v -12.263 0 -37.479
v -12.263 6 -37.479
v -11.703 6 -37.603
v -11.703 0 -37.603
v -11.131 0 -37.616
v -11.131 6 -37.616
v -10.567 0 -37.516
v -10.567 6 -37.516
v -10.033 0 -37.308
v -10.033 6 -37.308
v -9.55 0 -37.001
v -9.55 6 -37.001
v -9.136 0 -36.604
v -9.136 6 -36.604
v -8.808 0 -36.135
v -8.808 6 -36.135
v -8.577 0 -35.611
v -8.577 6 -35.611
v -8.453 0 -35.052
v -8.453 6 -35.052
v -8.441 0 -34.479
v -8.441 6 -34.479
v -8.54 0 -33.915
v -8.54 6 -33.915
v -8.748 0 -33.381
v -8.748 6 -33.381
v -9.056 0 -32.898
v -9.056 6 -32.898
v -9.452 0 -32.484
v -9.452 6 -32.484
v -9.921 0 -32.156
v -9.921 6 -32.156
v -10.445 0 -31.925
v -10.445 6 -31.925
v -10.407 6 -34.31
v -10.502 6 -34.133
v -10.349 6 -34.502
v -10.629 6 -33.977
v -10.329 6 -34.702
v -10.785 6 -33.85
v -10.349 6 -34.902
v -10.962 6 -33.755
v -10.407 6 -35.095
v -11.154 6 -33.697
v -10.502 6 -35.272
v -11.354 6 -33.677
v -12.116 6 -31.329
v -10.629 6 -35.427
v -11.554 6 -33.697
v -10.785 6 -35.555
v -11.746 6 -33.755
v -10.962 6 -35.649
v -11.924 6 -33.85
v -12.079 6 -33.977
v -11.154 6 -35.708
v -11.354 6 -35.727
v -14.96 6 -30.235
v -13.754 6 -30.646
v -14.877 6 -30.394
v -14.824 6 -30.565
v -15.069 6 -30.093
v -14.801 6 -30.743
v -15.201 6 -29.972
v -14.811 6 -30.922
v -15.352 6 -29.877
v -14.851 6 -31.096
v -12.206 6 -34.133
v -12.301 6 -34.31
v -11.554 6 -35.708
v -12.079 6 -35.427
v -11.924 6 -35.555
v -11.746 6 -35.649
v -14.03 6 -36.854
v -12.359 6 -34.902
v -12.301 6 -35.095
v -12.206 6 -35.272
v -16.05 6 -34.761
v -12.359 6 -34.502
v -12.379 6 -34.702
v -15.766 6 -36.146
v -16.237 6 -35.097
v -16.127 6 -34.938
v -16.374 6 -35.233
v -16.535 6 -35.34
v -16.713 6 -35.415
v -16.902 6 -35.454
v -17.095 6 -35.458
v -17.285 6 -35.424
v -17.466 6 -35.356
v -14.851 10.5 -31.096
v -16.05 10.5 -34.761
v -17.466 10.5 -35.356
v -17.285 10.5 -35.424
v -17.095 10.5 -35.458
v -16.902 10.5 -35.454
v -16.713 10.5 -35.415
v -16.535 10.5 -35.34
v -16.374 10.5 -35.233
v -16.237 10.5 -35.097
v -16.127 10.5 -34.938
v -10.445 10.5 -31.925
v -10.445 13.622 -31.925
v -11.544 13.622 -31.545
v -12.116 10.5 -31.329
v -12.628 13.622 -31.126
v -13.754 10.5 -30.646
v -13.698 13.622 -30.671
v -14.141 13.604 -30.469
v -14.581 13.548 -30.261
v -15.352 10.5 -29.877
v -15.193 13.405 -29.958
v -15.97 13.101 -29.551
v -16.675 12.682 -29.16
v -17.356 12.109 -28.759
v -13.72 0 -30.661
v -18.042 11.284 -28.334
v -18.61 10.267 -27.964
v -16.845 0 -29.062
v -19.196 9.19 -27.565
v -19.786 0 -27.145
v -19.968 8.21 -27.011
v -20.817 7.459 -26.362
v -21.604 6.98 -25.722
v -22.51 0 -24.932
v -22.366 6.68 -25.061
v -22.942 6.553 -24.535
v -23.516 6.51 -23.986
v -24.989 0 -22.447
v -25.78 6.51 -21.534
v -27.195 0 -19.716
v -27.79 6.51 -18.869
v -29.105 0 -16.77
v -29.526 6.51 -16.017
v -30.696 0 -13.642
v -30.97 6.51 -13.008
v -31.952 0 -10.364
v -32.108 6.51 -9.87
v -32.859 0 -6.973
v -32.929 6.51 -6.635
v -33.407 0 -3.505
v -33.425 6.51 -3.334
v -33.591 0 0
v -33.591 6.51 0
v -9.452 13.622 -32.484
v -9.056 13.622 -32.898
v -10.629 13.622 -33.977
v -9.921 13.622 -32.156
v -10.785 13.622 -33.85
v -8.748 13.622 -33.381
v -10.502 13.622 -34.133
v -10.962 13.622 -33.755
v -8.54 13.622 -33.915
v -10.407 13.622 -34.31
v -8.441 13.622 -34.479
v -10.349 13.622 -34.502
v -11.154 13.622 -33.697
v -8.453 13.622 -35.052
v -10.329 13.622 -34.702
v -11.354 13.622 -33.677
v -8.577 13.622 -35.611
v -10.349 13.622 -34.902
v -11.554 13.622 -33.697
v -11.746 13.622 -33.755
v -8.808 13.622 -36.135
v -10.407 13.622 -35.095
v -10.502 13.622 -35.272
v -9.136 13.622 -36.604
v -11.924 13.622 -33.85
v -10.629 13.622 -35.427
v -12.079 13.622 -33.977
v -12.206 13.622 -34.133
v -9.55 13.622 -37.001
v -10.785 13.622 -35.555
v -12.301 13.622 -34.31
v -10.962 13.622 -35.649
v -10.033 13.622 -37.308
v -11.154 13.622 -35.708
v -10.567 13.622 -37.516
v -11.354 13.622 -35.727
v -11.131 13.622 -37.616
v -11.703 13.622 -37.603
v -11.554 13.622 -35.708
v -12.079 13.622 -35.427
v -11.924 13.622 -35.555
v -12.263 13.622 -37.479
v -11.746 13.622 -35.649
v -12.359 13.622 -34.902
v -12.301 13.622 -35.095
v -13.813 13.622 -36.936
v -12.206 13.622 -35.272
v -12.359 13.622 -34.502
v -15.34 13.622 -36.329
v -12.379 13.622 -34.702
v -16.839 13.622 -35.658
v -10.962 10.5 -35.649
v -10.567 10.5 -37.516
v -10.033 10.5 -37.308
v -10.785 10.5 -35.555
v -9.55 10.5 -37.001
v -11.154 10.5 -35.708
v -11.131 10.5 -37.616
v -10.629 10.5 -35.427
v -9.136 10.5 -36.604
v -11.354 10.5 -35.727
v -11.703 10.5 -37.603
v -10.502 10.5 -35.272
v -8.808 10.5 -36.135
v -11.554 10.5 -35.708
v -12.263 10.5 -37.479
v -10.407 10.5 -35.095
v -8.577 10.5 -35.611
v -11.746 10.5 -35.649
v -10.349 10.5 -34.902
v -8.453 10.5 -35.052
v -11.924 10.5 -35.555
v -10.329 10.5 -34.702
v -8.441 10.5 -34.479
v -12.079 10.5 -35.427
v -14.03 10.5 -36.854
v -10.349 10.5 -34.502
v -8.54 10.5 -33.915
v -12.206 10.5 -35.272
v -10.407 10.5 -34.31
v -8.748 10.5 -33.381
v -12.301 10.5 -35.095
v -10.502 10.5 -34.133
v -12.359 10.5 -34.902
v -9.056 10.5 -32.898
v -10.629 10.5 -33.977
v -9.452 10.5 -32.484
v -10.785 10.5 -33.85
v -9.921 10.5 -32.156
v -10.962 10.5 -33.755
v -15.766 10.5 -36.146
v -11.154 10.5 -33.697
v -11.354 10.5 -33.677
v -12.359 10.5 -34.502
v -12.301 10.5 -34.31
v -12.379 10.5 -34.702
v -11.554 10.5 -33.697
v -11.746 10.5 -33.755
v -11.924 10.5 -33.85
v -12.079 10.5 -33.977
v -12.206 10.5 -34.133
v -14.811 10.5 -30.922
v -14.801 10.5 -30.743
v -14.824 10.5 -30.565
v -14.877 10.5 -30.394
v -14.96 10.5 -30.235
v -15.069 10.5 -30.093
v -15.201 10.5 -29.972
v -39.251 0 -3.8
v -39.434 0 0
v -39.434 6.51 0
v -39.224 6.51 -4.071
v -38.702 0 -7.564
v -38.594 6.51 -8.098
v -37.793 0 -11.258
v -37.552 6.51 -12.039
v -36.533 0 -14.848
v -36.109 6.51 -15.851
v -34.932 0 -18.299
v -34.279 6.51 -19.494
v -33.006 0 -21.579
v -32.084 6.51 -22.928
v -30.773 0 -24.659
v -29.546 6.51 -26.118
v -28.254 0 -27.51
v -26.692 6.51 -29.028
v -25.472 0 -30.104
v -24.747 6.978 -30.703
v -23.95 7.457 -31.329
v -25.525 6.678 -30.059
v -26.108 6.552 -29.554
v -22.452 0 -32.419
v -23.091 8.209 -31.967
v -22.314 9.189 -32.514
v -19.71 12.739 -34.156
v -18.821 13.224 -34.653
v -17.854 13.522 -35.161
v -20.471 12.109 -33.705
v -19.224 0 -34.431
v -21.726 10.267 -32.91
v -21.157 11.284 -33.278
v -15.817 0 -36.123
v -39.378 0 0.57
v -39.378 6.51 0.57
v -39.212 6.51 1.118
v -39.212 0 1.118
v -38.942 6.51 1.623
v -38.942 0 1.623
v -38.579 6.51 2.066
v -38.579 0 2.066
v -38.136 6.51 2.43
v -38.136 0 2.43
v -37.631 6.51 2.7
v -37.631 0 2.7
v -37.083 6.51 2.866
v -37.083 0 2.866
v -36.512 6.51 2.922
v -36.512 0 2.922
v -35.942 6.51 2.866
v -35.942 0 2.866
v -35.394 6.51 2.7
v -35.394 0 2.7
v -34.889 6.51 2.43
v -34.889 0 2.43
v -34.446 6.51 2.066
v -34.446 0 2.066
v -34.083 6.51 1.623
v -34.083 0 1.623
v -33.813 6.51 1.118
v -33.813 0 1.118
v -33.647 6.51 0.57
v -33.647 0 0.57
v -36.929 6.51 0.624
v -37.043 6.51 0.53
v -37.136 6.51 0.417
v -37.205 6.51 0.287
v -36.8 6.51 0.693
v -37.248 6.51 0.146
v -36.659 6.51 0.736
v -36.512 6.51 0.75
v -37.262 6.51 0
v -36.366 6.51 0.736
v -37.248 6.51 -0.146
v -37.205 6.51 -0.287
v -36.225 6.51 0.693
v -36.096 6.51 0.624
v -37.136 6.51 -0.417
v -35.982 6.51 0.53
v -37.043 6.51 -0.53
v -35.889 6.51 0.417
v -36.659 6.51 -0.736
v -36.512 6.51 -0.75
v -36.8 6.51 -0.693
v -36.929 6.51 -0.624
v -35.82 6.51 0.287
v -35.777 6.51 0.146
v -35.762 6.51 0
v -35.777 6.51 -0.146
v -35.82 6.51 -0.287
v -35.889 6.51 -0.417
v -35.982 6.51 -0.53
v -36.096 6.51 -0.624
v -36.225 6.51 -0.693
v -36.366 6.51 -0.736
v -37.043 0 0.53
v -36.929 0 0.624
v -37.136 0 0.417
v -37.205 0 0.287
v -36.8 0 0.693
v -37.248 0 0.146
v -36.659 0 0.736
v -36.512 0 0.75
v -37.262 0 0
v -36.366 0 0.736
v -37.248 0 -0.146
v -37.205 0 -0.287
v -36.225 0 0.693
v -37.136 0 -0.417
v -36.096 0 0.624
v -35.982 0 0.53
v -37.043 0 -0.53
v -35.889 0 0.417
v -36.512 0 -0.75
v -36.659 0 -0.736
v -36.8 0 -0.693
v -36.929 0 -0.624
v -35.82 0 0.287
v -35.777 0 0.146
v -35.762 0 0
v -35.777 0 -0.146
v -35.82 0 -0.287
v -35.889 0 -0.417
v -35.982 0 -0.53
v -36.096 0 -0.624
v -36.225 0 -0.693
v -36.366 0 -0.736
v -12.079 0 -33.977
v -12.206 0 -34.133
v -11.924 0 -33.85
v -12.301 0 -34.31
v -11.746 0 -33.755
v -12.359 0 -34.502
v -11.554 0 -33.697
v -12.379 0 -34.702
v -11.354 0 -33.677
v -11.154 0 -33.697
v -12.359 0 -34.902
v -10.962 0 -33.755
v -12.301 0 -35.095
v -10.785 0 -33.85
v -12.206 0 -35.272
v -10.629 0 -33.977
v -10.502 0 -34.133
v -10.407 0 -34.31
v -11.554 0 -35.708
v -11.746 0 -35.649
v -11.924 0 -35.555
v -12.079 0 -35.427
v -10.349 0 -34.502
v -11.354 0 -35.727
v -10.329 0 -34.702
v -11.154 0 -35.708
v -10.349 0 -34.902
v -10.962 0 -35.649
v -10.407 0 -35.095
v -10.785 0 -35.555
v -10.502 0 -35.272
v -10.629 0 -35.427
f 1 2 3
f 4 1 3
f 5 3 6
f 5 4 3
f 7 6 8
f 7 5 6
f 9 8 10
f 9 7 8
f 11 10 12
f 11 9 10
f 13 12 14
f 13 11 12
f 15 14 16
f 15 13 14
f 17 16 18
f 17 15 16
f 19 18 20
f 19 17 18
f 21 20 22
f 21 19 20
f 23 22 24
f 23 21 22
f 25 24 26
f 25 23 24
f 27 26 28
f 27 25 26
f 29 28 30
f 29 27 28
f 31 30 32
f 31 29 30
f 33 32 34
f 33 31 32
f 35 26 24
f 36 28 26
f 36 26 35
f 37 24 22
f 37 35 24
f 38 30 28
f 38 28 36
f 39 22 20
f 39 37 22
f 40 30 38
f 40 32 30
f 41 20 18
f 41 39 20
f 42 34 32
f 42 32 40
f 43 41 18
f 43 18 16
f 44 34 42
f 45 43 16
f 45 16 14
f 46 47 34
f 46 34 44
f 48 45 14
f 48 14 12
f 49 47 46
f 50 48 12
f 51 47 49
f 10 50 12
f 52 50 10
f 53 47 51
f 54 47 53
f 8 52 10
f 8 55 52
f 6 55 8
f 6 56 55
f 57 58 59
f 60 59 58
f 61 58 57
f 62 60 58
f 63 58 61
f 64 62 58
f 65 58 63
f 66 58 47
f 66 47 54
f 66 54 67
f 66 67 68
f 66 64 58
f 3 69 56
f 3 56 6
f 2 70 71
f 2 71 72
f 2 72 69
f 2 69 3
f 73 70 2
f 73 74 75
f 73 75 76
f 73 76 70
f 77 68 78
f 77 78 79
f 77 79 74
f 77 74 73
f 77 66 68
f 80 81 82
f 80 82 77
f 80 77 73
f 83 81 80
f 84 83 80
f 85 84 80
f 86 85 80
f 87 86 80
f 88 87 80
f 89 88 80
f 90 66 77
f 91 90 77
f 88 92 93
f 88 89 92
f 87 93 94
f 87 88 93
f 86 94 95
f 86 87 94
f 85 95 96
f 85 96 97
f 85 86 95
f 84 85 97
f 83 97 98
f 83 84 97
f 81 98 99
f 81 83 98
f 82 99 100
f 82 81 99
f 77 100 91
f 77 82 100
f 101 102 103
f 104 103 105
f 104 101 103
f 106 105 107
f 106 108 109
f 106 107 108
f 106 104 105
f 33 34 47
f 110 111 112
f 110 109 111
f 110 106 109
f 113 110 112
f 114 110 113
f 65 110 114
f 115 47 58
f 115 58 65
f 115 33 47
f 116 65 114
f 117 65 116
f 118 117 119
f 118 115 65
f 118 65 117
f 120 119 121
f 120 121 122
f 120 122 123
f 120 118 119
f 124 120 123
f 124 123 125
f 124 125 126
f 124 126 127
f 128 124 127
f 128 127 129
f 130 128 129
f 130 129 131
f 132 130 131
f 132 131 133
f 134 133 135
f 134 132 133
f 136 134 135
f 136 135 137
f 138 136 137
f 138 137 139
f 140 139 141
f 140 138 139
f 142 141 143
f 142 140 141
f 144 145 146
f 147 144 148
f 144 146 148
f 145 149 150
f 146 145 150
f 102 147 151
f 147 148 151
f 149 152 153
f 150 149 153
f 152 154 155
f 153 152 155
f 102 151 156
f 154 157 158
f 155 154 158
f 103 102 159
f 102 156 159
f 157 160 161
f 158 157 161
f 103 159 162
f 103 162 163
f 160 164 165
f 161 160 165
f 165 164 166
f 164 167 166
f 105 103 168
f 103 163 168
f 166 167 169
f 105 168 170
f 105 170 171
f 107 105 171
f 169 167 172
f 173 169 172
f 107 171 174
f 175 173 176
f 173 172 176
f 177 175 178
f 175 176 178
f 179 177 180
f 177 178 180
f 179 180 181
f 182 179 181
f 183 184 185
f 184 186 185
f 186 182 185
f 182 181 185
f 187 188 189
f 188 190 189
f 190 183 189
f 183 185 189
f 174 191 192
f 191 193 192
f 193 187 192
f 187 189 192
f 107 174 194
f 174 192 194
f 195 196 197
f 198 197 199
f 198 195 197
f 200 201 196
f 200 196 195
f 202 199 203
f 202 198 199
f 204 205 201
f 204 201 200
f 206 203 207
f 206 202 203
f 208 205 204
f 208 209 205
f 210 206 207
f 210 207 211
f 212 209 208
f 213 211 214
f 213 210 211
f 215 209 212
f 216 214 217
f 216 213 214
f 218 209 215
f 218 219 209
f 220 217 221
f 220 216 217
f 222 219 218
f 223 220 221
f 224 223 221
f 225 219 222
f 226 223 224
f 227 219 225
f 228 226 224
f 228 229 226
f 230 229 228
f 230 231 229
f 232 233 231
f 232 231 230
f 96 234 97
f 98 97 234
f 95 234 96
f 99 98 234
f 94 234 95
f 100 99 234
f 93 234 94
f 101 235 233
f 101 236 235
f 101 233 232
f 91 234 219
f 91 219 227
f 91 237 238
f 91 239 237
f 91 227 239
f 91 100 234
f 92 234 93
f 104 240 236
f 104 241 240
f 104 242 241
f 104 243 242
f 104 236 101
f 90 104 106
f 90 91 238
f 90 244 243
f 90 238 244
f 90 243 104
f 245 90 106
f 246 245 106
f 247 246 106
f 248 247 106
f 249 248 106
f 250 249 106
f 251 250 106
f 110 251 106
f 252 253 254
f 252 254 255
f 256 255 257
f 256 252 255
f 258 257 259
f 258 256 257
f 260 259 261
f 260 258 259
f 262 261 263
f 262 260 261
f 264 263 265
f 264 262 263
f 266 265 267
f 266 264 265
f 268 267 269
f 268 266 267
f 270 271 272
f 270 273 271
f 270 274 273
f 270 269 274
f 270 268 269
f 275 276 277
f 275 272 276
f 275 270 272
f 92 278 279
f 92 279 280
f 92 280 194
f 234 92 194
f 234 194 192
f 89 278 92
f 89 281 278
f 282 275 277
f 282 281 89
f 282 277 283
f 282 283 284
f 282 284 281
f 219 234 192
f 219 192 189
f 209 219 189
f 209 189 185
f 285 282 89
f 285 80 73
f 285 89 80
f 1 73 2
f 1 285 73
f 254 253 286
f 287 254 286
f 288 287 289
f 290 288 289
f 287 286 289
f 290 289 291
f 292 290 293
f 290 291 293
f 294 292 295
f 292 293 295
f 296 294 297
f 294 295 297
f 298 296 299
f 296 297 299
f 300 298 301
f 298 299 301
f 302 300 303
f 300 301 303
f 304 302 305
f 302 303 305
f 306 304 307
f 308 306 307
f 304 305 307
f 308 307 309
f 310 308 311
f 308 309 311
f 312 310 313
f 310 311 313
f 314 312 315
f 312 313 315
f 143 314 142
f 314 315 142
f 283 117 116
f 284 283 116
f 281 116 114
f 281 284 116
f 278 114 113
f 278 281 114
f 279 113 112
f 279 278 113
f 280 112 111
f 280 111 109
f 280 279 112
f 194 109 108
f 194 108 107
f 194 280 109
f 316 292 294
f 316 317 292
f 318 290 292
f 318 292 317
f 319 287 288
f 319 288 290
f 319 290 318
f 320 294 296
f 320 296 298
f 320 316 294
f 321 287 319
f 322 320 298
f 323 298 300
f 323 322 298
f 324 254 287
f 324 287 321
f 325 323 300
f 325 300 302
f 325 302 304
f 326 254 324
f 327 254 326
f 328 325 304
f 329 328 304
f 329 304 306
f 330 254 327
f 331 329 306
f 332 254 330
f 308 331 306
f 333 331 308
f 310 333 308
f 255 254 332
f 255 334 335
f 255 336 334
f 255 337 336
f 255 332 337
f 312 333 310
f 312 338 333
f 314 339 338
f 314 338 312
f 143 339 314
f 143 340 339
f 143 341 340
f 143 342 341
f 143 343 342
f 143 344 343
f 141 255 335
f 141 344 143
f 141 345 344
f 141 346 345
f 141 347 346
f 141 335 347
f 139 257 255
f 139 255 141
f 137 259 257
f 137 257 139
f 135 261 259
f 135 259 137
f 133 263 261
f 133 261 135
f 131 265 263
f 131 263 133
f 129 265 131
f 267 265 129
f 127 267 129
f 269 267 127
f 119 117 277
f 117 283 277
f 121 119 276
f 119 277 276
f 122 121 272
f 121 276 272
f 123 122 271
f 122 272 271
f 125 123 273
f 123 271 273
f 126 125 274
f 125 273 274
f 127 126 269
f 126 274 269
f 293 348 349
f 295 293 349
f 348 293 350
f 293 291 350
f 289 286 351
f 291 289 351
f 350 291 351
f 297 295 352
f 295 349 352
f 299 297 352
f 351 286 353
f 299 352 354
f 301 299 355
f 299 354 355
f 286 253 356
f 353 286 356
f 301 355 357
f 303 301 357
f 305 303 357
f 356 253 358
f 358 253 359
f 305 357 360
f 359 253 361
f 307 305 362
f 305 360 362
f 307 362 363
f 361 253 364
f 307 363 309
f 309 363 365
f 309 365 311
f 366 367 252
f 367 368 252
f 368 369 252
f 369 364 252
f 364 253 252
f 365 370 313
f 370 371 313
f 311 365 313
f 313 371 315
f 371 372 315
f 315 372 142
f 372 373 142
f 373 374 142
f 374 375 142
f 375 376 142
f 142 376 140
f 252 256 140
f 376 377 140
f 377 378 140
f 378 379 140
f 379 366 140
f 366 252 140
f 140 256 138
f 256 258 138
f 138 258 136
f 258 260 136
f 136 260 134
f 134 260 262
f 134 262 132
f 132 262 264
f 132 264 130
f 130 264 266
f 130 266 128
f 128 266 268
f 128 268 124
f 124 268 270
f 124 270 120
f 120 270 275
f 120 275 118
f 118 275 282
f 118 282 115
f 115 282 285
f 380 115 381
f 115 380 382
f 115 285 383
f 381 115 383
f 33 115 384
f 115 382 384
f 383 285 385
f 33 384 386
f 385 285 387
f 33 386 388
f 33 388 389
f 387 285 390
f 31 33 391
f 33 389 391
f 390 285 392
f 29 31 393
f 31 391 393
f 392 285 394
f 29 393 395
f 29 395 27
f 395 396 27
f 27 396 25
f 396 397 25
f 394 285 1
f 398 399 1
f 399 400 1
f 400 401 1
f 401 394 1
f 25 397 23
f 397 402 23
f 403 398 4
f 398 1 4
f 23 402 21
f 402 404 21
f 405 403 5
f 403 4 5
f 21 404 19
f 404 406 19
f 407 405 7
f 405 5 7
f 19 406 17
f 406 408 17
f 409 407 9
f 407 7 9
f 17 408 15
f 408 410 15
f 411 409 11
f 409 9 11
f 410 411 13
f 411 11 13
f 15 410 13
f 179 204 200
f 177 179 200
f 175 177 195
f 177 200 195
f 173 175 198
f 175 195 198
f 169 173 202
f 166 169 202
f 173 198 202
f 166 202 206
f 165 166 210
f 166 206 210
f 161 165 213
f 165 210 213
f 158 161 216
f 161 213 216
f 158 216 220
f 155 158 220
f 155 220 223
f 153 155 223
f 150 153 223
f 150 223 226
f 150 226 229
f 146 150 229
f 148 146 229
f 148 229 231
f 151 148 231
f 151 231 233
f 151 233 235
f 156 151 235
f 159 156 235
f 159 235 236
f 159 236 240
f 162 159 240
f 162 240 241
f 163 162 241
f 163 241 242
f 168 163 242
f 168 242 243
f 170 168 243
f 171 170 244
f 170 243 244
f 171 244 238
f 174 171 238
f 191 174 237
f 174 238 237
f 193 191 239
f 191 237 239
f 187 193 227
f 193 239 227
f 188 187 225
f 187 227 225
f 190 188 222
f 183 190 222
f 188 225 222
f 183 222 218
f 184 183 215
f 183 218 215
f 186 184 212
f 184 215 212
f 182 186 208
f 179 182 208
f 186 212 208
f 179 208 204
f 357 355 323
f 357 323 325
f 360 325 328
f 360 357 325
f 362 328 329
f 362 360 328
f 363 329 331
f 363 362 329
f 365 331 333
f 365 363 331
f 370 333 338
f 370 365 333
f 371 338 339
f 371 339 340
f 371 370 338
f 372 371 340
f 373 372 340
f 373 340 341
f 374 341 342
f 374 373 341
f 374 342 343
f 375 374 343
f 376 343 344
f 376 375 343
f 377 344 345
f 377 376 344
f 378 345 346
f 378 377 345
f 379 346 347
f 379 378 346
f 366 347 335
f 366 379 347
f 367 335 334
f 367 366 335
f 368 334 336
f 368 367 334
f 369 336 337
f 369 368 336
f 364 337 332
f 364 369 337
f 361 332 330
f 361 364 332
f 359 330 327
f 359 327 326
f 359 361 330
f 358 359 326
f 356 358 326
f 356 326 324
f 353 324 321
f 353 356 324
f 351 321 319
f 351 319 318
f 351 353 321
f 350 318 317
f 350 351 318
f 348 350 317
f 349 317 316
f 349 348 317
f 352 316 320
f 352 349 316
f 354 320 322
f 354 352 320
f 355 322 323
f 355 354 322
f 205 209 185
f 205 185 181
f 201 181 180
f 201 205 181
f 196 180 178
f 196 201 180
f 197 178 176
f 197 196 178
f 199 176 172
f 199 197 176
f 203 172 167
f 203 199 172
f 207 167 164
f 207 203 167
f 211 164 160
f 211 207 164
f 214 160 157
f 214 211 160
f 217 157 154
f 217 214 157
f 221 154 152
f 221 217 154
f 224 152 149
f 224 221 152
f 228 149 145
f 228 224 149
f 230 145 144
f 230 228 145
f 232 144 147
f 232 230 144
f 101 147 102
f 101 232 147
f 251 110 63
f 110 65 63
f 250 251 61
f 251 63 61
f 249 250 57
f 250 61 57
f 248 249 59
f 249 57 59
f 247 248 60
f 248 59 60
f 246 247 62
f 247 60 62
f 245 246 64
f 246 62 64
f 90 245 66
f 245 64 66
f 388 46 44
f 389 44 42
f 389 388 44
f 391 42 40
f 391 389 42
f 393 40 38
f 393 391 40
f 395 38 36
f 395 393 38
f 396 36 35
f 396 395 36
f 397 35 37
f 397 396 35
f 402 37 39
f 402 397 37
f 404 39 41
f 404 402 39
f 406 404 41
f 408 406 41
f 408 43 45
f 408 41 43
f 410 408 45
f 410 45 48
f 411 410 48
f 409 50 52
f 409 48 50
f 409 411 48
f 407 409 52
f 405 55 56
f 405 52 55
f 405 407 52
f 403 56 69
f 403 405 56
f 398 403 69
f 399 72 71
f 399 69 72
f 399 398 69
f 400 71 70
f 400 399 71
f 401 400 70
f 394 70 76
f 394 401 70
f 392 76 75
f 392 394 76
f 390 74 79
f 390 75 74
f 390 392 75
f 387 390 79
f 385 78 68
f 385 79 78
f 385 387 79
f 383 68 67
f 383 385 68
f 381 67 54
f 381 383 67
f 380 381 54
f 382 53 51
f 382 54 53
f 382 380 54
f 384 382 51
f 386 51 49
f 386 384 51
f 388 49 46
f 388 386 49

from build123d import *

# Parameters (mm, degrees)
SKETCH1_R               = 0.7499999999999986
SKETCH1_R_2             = 1.0249999999999995
BOSS_EXTRUDE1_DEPTH     = 6.510019999999999
BOSS_EXTRU_1_DEPTH      = 7.112
CONG_1_R                = 7.112
CONG_2_R                = 6.35
ENL_V_MAT_EXTRU_1_DEPTH = 4.444999999999999
ESQUISSE4_R             = 1.024999999999998
ENL_V_MAT_EXTRU_2_DEPTH = 57.18027536353634
CONG_3_R                = 1.016


with BuildPart() as part:
    # Sketch1 → Boss-Extrude1 (new body)
    with BuildSketch(Plane(origin=(0, 0, 0), x_dir=(1, 0, 0), z_dir=(0, 1, 0))):
        with BuildLine():
            ThreePointArc((-33.59051080682659, 0), (-27.195497439499345, 19.716169386615615), (-10.445442396451748, 31.92514916810793))
            ThreePointArc((-10.445442396451748, 31.92514916810793), (-8.576954256445317, 35.61090468912391), (-12.262709777461287, 37.4793928291303))
            ThreePointArc((-12.262709777461287, 37.4793928291303), (-31.926890187777666, 23.14633061338439), (-39.43448919317339, 0))
            ThreePointArc((-39.43448919317339, 0), (-36.512499999999996, -2.9219891931734026), (-33.59051080682659, 0))
        make_face()
        with Locations(Location((-36.512499999999996, 0, 0), (0, 0, 270))):
            Circle(SKETCH1_R, mode=Mode.SUBTRACT)
        with Locations(Location((-11.354076086956523, 34.702270998619134, 0), (0, 0, 270))):
            Circle(SKETCH1_R_2, mode=Mode.SUBTRACT)
    extrude(amount=BOSS_EXTRUDE1_DEPTH)

    # Esquisse1 → Boss.-Extru.1 (add)
    with BuildSketch(Plane(origin=(0, 6.510019999999999, 0), x_dir=(1, 0, 0), z_dir=(0, 1, 0))):
        with BuildLine():
            Line((-17.904180753250905, 28.421166897551096), (-21.0190975209346, 33.36579801731034))
            ThreePointArc((-21.0190975209346, 33.36579801731034), (-16.767530820930304, 35.69213986434075), (-12.262709777461293, 37.47939282913032))
            ThreePointArc((-12.262709777461293, 37.47939282913032), (-8.576954256445317, 35.610904689123906), (-10.44544239645175, 31.92514916810793))
            ThreePointArc((-10.44544239645175, 31.92514916810793), (-14.282673283409979, 30.40275744308238), (-17.904180753250905, 28.421166897551096))
        make_face()
    extrude(amount=BOSS_EXTRU_1_DEPTH)

    # Congé1
    cong_1_edges = [part.edges().sort_by_distance(p)[0] for p in [
        (-19.461639137092753, 6.510019999999999, -30.893482457430718),
    ]]
    fillet(cong_1_edges, radius=CONG_1_R - 0.0001)  # a hair under: the kernel refuses the full size

    # Congé2
    cong_2_edges = [part.edges().sort_by_distance(p)[0] for p in [
        (-19.461639137092753, 13.62202, -30.893482457430718),
    ]]
    fillet(cong_2_edges, radius=CONG_2_R)

    # Esquisse3 → Enlèv. mat.-Extru.1 (cut, symmetric)
    with BuildSketch(Plane(origin=(-12.262709777461295, 0, -37.479392829130326), x_dir=(0.3109640831758033, 0, 0.9504216637759433), z_dir=(-0.9504216637759433, 0, 0.3109640831758033))):
        Polygon((-5.92976249492949, 10.499999999999998), (8.153118343955157, 10.499999999999998), (8.153118343955159, 6), (-5.92976249492949, 6), align=None)
    extrude(amount=ENL_V_MAT_EXTRU_1_DEPTH, both=True, mode=Mode.SUBTRACT)

    # Esquisse4 → Enlèv. mat.-Extru.2 (cut, through all)
    with BuildSketch(Plane.XZ):
        with Locations(Location((-11.354076086956523, -34.702270998619134, 0), (0, 0, 270))):
            Circle(ESQUISSE4_R)
    extrude(amount=-ENL_V_MAT_EXTRU_2_DEPTH, mode=Mode.SUBTRACT)

    # Congé3
    cong_3_edges = [part.edges().sort_by_distance(p)[0] for p in [
        (-16.409183233920817, 8.25, -35.85829950683831),
        (-14.578207843975182, 8.25, -30.262159082282853),
    ]]
    fillet(cong_3_edges, radius=CONG_3_R)


solid = part.part
